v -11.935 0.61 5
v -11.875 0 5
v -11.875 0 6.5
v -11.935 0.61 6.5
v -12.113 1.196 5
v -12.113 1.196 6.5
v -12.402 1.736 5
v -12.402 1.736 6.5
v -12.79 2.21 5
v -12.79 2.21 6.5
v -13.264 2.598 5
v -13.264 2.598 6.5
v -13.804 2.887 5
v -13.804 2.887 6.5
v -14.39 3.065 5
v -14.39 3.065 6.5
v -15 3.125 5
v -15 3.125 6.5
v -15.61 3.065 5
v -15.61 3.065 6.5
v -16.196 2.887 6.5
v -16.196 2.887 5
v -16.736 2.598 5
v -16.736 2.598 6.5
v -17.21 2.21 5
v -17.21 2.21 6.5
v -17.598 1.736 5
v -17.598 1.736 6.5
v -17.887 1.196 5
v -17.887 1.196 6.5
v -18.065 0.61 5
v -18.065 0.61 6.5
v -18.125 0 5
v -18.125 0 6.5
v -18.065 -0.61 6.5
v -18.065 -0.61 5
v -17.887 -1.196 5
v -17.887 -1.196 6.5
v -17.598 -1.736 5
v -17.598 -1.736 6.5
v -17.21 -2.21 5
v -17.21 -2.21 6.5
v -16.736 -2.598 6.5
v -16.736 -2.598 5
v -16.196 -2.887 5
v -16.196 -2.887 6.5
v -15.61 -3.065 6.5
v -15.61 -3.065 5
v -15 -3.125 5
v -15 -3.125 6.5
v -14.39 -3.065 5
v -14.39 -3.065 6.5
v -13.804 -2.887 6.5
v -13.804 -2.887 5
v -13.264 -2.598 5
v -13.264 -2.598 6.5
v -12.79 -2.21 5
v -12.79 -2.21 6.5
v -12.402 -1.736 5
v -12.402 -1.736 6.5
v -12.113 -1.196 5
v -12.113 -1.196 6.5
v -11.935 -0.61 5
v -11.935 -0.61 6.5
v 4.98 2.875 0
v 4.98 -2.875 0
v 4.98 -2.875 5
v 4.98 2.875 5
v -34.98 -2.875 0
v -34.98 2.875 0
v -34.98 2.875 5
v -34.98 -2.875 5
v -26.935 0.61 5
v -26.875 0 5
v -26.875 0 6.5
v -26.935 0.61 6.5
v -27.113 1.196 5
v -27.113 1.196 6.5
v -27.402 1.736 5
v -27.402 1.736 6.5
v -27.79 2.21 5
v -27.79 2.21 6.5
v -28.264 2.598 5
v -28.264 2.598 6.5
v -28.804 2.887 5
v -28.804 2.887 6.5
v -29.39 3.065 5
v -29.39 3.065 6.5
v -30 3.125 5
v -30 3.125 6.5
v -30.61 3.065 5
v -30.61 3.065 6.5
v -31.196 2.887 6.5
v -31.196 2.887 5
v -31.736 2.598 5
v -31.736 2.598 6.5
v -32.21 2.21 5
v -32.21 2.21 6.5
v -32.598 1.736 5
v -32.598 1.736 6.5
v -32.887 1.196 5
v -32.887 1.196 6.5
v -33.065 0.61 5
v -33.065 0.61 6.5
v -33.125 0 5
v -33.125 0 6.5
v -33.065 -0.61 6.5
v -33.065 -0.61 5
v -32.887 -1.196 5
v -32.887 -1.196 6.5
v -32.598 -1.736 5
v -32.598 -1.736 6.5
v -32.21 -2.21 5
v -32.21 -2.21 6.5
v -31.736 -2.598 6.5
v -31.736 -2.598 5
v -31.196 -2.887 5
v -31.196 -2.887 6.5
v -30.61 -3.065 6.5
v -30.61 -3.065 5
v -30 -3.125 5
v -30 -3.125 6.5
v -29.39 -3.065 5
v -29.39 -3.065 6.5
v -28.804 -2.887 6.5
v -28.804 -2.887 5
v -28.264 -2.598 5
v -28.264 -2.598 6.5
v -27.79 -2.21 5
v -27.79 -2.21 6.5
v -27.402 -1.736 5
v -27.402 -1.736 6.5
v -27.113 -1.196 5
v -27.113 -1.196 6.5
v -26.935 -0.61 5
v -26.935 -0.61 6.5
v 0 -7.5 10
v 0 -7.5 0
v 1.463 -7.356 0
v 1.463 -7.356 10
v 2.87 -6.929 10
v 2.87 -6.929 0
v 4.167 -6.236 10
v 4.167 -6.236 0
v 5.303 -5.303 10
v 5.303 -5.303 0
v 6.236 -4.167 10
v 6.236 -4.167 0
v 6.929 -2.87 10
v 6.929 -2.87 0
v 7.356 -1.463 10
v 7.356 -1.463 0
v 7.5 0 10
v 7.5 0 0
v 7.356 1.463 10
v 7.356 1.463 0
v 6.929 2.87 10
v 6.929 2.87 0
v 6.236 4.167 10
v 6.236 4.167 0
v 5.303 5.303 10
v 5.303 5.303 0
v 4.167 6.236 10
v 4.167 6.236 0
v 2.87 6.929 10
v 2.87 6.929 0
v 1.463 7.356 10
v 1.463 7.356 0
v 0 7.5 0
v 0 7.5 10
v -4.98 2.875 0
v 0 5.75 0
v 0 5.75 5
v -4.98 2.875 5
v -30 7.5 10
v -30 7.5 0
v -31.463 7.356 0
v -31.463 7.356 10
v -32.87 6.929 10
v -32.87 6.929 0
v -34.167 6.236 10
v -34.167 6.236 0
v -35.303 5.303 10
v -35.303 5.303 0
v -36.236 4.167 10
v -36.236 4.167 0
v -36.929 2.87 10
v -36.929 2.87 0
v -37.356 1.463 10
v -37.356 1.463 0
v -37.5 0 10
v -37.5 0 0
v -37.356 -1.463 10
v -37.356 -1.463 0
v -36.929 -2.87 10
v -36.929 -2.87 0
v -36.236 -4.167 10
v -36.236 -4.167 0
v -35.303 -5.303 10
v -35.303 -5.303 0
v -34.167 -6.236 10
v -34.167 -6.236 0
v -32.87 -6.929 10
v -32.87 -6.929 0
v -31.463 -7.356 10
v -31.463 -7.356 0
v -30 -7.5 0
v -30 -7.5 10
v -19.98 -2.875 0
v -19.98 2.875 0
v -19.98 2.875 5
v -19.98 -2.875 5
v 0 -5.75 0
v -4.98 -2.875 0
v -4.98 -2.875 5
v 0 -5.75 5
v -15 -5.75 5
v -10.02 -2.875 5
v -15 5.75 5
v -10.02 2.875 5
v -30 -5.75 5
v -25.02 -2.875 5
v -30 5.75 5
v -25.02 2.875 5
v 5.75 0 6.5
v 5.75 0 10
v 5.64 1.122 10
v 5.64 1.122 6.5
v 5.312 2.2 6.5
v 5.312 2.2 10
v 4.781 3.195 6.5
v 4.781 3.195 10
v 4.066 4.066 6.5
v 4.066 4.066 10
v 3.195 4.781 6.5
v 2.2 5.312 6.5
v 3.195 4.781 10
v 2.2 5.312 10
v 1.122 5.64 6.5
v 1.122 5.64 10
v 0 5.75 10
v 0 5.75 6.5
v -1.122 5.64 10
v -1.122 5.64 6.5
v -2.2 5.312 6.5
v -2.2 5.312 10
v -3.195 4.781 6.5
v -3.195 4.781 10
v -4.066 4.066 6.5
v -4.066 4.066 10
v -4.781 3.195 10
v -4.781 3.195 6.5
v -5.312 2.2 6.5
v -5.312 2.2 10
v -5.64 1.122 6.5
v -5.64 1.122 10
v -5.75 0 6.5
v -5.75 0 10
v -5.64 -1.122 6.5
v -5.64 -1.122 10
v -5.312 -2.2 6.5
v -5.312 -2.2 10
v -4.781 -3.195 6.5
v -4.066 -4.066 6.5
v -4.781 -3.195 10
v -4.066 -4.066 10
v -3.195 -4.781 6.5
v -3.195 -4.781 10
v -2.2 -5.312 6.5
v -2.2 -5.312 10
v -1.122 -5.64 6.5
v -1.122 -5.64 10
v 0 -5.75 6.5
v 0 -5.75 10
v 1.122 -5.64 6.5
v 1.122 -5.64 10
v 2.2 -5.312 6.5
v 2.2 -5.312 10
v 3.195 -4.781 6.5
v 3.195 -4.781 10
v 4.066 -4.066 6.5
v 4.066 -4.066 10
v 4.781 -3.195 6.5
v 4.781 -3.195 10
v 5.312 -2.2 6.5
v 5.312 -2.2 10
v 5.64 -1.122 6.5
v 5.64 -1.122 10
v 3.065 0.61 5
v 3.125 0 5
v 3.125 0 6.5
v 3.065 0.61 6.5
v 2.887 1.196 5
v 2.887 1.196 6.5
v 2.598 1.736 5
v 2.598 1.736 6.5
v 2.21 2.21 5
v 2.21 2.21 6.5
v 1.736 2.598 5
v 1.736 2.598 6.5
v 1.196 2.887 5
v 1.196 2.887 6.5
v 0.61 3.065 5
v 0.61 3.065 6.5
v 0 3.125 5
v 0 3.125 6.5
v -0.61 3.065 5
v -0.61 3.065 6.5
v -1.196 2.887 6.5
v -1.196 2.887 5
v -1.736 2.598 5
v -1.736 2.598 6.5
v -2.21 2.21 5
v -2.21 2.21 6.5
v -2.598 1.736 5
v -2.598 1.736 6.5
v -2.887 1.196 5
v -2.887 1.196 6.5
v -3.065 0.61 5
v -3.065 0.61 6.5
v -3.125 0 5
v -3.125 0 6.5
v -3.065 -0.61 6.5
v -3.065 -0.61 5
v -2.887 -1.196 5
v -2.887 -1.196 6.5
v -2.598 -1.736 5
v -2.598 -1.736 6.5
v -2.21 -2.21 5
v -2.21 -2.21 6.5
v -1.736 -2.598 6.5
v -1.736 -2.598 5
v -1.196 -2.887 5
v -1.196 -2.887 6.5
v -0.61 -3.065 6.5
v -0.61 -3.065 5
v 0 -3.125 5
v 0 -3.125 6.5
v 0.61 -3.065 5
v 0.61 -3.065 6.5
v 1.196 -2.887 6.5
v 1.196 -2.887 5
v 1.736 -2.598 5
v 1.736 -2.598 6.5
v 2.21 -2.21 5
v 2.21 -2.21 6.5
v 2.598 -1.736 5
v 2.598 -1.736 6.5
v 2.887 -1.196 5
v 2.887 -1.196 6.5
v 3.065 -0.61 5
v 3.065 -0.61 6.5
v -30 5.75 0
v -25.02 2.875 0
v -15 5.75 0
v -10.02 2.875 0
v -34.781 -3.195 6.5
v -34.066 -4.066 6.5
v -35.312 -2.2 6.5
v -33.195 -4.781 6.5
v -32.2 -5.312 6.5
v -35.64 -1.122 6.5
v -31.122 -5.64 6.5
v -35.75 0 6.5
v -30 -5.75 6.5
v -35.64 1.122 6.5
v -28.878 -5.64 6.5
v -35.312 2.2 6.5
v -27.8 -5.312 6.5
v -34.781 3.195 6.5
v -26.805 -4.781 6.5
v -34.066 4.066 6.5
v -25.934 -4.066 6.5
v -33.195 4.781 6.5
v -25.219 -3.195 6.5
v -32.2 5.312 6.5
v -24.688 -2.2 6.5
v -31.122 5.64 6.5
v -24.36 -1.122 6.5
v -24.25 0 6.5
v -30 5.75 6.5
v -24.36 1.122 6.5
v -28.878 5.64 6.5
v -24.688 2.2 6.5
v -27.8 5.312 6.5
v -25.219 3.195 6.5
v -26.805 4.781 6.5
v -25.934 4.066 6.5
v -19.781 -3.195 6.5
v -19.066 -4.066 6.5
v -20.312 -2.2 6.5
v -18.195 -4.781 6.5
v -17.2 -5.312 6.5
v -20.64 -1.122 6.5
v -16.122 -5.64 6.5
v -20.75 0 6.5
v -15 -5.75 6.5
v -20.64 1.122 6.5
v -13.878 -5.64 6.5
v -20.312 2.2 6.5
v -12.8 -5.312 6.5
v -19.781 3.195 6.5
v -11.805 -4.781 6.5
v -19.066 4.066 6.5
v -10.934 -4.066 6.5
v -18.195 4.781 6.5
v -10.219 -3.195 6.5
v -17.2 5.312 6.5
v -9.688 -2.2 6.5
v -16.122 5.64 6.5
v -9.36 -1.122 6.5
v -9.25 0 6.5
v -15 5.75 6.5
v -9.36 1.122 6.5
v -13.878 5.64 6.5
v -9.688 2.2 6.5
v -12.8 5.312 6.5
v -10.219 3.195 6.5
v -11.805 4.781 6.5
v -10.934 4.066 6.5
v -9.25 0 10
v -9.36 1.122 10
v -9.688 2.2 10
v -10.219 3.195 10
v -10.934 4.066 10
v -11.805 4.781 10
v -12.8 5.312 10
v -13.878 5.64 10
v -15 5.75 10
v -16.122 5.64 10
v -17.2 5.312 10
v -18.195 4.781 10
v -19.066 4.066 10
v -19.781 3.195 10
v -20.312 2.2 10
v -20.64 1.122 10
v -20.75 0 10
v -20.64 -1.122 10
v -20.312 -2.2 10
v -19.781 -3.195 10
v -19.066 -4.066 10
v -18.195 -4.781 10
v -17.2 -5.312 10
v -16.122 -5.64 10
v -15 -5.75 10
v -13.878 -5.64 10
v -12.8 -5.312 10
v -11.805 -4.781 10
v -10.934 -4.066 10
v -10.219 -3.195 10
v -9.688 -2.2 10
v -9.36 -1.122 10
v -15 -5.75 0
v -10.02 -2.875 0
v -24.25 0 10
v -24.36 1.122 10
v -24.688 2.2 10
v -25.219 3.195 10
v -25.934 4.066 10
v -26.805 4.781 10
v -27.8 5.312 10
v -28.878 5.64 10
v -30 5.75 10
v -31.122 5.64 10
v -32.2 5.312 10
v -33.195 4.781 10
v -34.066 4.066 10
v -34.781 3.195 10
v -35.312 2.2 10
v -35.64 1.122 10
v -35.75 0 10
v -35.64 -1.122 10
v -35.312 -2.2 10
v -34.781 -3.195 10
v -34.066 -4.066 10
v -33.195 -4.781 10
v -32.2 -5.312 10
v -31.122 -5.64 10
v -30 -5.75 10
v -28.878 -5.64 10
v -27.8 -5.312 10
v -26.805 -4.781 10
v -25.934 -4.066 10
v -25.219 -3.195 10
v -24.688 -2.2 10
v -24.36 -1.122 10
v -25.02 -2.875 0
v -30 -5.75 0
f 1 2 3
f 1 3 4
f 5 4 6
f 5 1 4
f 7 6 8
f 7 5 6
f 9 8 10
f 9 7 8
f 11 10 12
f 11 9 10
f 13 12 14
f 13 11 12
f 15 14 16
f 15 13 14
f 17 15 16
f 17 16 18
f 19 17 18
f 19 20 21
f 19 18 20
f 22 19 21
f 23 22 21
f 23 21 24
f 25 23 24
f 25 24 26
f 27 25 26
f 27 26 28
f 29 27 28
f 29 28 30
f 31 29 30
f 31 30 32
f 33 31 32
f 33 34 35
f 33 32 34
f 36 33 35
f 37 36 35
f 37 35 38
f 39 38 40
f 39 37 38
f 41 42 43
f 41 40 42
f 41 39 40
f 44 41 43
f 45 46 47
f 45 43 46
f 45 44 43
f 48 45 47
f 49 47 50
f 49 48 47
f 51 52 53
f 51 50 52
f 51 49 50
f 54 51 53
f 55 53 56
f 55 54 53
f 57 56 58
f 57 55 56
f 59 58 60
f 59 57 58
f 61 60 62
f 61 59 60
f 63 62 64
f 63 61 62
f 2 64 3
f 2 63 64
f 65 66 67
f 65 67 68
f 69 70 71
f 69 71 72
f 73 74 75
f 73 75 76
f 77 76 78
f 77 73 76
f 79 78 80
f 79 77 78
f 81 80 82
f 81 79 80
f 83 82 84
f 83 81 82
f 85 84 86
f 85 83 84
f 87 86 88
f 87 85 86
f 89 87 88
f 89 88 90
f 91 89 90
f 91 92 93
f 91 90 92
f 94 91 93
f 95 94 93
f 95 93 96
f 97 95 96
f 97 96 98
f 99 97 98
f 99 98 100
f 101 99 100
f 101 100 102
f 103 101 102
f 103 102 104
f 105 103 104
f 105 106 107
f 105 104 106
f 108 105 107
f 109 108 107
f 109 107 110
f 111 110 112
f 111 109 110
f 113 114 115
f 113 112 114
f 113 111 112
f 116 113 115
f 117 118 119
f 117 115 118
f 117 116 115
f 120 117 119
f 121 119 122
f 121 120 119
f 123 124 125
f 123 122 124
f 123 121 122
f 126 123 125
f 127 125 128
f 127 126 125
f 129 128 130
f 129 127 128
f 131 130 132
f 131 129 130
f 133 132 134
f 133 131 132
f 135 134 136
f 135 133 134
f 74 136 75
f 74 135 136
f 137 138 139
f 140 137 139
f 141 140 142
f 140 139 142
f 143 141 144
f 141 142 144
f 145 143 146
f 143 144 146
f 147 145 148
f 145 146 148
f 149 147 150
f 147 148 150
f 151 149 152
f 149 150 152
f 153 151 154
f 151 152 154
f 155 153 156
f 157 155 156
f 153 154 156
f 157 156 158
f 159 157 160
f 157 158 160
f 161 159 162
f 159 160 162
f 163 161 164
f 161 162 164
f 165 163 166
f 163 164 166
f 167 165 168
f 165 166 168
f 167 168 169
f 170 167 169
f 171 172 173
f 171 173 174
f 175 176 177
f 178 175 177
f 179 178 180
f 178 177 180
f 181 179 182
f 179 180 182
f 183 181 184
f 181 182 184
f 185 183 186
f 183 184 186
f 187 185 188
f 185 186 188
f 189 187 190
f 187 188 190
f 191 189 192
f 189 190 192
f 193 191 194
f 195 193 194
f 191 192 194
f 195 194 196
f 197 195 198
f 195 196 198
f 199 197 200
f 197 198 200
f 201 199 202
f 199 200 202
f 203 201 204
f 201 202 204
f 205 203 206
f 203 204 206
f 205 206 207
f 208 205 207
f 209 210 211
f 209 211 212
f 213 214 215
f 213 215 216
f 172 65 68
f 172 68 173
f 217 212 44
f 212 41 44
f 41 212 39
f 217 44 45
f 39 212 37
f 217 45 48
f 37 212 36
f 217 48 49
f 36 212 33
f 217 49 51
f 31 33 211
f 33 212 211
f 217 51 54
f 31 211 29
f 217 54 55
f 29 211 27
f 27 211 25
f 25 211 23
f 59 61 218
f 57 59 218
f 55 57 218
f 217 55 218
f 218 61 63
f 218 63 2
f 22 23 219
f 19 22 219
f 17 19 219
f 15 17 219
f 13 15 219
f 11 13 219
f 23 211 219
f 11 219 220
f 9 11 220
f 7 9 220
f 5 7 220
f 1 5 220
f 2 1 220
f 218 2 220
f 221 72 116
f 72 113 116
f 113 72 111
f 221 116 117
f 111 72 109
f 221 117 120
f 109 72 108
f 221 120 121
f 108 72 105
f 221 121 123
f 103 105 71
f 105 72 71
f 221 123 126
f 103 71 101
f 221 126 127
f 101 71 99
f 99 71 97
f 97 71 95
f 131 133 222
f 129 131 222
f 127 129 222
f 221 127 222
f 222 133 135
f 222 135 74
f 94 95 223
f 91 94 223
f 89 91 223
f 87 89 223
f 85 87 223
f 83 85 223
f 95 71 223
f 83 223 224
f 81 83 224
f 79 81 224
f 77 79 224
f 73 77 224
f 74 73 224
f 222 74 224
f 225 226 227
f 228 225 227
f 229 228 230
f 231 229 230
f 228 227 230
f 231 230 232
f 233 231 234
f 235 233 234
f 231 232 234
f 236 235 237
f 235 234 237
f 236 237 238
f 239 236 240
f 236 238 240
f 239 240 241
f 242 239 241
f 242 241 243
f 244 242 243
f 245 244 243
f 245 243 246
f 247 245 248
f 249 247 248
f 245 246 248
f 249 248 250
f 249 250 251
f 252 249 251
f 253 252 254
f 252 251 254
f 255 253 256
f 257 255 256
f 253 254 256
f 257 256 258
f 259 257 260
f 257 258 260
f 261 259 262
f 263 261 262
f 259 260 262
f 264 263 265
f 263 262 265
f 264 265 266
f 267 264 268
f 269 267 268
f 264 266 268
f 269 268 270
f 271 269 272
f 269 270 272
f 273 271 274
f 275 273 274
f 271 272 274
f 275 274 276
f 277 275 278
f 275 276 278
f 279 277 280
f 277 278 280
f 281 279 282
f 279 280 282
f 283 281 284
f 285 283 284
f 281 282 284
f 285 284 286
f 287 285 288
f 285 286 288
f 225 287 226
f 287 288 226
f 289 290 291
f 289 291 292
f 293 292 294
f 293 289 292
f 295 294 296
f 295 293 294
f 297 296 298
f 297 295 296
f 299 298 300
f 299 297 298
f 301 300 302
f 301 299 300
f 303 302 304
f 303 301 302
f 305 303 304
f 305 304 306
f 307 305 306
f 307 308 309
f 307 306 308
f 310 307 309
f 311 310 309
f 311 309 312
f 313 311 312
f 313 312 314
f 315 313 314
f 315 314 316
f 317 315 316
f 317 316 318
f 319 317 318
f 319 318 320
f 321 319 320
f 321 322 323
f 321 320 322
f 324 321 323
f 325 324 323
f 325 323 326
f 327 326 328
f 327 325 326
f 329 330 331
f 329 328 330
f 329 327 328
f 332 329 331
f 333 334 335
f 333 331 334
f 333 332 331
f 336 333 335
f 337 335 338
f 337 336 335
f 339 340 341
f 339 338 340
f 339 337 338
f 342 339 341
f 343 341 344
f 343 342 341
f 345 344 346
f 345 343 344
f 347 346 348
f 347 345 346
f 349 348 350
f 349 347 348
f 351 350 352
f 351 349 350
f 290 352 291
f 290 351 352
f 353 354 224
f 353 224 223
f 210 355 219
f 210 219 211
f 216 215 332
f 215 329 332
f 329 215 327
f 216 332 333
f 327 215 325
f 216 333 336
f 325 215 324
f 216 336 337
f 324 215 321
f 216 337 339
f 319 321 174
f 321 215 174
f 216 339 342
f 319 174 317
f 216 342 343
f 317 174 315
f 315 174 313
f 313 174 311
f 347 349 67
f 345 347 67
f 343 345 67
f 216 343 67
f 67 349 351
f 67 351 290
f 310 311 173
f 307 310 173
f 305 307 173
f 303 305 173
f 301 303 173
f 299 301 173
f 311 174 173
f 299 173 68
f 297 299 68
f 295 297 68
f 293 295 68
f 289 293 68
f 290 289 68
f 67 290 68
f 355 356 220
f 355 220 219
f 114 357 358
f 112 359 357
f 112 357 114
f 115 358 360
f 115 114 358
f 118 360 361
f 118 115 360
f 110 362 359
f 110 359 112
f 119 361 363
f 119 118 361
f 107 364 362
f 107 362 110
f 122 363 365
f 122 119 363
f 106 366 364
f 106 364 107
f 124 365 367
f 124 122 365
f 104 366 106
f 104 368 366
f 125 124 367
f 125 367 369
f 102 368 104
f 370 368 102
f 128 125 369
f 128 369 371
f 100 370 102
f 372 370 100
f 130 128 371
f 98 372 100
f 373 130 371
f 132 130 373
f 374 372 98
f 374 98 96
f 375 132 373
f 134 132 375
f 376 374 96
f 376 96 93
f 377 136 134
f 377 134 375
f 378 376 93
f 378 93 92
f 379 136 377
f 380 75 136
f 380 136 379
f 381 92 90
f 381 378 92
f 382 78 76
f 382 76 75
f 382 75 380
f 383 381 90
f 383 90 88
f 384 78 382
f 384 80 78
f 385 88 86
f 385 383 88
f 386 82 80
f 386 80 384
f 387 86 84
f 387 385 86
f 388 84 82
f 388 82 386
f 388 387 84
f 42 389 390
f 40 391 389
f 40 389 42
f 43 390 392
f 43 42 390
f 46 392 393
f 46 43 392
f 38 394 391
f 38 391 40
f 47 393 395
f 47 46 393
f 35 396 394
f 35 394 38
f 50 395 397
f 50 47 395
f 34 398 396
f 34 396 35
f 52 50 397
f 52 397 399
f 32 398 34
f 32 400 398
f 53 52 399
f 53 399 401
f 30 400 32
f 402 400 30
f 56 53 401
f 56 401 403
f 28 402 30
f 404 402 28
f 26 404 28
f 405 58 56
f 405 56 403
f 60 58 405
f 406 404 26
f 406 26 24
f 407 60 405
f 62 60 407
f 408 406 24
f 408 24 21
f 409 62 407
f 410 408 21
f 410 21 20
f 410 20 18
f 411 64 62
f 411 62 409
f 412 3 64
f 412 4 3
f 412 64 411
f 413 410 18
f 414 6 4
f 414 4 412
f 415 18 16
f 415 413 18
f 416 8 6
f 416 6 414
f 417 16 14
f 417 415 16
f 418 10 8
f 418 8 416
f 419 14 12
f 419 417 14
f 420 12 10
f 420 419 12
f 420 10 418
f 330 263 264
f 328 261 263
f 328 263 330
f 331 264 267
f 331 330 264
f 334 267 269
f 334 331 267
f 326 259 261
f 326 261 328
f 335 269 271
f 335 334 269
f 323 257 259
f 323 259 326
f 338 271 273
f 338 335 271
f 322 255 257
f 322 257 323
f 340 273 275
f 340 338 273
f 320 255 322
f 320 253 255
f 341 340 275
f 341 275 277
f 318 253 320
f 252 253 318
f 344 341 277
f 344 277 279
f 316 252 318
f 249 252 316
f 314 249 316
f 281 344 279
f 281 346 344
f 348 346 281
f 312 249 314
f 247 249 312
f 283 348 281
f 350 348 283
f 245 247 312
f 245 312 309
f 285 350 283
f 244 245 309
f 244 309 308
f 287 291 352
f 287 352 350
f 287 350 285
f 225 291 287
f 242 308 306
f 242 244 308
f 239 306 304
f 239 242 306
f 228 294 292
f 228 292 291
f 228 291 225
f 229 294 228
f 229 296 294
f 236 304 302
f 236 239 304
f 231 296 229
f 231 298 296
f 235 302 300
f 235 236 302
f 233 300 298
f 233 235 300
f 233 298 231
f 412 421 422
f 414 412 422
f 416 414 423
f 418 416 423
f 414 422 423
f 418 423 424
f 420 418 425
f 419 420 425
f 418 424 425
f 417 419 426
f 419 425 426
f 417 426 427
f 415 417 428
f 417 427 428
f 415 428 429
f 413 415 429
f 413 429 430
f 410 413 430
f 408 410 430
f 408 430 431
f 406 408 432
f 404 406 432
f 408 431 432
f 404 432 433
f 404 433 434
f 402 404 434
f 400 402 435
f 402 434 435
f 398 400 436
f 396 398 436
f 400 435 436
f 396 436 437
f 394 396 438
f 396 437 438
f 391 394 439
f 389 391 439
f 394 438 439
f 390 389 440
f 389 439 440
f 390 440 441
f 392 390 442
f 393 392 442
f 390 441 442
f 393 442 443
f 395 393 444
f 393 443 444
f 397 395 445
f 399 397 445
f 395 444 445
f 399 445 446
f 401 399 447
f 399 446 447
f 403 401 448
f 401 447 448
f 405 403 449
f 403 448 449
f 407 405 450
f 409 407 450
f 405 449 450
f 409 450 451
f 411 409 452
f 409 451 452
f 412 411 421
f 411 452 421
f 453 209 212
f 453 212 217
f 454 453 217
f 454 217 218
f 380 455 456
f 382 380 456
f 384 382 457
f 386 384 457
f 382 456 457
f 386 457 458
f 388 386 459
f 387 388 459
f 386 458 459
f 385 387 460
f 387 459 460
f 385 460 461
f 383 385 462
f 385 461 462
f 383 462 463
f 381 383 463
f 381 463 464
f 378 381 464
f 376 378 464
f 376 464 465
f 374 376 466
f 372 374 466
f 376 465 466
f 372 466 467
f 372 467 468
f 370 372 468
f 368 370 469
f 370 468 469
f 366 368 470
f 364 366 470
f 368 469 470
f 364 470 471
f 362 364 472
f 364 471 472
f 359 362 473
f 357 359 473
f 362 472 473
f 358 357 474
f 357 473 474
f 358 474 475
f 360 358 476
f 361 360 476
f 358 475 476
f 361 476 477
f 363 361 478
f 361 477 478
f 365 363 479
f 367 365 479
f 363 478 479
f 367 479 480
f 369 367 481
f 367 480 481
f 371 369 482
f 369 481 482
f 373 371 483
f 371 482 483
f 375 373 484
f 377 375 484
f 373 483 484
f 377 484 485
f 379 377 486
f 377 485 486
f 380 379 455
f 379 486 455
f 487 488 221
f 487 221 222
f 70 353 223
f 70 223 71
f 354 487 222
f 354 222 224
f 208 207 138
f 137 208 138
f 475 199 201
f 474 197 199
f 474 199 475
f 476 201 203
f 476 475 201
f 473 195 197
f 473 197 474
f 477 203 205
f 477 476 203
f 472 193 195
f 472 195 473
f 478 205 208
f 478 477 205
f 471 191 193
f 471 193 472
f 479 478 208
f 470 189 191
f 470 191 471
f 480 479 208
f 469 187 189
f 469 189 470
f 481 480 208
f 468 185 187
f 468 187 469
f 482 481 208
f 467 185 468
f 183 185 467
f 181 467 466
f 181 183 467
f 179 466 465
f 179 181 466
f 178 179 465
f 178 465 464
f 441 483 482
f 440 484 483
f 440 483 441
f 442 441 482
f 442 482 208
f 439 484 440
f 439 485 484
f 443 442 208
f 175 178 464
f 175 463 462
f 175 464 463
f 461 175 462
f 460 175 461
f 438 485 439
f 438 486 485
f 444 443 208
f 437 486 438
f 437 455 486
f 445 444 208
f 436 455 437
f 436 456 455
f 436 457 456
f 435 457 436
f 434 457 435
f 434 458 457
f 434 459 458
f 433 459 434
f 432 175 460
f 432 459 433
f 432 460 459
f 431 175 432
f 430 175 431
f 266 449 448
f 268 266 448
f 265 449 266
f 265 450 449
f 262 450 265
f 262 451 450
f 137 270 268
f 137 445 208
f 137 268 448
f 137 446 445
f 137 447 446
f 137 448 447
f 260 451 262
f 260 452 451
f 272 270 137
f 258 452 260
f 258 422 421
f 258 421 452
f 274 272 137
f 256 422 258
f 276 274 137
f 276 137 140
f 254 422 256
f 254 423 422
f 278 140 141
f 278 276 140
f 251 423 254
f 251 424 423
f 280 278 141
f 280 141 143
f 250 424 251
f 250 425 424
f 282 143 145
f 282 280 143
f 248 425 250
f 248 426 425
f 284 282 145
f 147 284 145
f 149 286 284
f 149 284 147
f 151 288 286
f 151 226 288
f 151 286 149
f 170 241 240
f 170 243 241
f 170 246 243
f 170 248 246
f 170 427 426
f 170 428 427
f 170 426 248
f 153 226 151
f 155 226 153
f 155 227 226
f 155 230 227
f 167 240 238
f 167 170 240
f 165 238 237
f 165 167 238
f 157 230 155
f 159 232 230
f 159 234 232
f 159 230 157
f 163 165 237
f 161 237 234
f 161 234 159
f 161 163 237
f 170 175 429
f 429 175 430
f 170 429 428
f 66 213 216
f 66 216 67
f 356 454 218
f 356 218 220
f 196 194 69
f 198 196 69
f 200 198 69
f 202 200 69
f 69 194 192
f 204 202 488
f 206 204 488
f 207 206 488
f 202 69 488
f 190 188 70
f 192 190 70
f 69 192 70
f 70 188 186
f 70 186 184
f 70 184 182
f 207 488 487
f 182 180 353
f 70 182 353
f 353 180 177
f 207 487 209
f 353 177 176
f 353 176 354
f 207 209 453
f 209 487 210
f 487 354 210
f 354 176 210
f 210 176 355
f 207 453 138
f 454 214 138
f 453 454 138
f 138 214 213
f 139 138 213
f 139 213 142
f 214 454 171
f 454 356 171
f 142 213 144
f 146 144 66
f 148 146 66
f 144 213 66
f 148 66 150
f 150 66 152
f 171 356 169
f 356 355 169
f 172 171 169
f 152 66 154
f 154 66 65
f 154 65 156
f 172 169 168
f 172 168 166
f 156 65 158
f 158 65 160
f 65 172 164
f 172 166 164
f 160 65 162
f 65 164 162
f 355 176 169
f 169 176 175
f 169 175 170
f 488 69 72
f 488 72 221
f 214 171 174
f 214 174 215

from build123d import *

# Parameters (mm, degrees)
PAD_DEPTH       = 10
SKETCH001_R     = 3.125
POCKET_DEPTH    = 10.001
SKETCH003_R     = 5.75
POCKET001_DEPTH = 3.5
POCKET002_DEPTH = 5


with BuildPart() as part:
    # Sketch → Pad (new body)
    with BuildSketch(Plane.XY):
        with BuildLine():
            ThreePointArc((-30, 7.5), (-37.5, 0), (-30, -7.5))
            Line((-30, -7.5), (0, -7.5))
            ThreePointArc((0, -7.5), (7.5, 0), (0, 7.5))
            Line((-30, 7.5), (0, 7.5))
        make_face()
    extrude(amount=PAD_DEPTH)

    # Sketch001 → Pocket (cut, through all)
    with BuildSketch(Plane.XY):
        with Locations((-15, 0)):
            Circle(SKETCH001_R)
        Circle(SKETCH001_R)
        with Locations((-30, 0)):
            Circle(SKETCH001_R)
    extrude(amount=POCKET_DEPTH, mode=Mode.SUBTRACT)

    # Sketch003 → Pocket001 (cut)
    with BuildSketch(Plane.XY.offset(10)):
        with Locations((-15, 0)):
            Circle(SKETCH003_R)
        with Locations((-30, 0)):
            Circle(SKETCH003_R)
        Circle(SKETCH003_R)
    extrude(amount=-POCKET001_DEPTH, mode=Mode.SUBTRACT)

    # Sketch004 → Pocket002 (cut)
    with BuildSketch(Plane.XY):
        Polygon((4.979646, -2.875), (4.979646, 2.875), (0, 5.75), (-4.979646, 2.875), (-4.979646, -2.875), (0, -5.75), align=None)
        Polygon((-25.020354, -2.875), (-25.020354, 2.875), (-30, 5.75), (-34.979646, 2.875), (-34.979646, -2.875), (-30, -5.75), align=None)
        Polygon((-10.020354, -2.875), (-10.020354, 2.875), (-15, 5.75), (-19.979646, 2.875), (-19.979646, -2.875), (-15, -5.75), align=None)
    extrude(amount=POCKET002_DEPTH, mode=Mode.SUBTRACT)


solid = part.part
